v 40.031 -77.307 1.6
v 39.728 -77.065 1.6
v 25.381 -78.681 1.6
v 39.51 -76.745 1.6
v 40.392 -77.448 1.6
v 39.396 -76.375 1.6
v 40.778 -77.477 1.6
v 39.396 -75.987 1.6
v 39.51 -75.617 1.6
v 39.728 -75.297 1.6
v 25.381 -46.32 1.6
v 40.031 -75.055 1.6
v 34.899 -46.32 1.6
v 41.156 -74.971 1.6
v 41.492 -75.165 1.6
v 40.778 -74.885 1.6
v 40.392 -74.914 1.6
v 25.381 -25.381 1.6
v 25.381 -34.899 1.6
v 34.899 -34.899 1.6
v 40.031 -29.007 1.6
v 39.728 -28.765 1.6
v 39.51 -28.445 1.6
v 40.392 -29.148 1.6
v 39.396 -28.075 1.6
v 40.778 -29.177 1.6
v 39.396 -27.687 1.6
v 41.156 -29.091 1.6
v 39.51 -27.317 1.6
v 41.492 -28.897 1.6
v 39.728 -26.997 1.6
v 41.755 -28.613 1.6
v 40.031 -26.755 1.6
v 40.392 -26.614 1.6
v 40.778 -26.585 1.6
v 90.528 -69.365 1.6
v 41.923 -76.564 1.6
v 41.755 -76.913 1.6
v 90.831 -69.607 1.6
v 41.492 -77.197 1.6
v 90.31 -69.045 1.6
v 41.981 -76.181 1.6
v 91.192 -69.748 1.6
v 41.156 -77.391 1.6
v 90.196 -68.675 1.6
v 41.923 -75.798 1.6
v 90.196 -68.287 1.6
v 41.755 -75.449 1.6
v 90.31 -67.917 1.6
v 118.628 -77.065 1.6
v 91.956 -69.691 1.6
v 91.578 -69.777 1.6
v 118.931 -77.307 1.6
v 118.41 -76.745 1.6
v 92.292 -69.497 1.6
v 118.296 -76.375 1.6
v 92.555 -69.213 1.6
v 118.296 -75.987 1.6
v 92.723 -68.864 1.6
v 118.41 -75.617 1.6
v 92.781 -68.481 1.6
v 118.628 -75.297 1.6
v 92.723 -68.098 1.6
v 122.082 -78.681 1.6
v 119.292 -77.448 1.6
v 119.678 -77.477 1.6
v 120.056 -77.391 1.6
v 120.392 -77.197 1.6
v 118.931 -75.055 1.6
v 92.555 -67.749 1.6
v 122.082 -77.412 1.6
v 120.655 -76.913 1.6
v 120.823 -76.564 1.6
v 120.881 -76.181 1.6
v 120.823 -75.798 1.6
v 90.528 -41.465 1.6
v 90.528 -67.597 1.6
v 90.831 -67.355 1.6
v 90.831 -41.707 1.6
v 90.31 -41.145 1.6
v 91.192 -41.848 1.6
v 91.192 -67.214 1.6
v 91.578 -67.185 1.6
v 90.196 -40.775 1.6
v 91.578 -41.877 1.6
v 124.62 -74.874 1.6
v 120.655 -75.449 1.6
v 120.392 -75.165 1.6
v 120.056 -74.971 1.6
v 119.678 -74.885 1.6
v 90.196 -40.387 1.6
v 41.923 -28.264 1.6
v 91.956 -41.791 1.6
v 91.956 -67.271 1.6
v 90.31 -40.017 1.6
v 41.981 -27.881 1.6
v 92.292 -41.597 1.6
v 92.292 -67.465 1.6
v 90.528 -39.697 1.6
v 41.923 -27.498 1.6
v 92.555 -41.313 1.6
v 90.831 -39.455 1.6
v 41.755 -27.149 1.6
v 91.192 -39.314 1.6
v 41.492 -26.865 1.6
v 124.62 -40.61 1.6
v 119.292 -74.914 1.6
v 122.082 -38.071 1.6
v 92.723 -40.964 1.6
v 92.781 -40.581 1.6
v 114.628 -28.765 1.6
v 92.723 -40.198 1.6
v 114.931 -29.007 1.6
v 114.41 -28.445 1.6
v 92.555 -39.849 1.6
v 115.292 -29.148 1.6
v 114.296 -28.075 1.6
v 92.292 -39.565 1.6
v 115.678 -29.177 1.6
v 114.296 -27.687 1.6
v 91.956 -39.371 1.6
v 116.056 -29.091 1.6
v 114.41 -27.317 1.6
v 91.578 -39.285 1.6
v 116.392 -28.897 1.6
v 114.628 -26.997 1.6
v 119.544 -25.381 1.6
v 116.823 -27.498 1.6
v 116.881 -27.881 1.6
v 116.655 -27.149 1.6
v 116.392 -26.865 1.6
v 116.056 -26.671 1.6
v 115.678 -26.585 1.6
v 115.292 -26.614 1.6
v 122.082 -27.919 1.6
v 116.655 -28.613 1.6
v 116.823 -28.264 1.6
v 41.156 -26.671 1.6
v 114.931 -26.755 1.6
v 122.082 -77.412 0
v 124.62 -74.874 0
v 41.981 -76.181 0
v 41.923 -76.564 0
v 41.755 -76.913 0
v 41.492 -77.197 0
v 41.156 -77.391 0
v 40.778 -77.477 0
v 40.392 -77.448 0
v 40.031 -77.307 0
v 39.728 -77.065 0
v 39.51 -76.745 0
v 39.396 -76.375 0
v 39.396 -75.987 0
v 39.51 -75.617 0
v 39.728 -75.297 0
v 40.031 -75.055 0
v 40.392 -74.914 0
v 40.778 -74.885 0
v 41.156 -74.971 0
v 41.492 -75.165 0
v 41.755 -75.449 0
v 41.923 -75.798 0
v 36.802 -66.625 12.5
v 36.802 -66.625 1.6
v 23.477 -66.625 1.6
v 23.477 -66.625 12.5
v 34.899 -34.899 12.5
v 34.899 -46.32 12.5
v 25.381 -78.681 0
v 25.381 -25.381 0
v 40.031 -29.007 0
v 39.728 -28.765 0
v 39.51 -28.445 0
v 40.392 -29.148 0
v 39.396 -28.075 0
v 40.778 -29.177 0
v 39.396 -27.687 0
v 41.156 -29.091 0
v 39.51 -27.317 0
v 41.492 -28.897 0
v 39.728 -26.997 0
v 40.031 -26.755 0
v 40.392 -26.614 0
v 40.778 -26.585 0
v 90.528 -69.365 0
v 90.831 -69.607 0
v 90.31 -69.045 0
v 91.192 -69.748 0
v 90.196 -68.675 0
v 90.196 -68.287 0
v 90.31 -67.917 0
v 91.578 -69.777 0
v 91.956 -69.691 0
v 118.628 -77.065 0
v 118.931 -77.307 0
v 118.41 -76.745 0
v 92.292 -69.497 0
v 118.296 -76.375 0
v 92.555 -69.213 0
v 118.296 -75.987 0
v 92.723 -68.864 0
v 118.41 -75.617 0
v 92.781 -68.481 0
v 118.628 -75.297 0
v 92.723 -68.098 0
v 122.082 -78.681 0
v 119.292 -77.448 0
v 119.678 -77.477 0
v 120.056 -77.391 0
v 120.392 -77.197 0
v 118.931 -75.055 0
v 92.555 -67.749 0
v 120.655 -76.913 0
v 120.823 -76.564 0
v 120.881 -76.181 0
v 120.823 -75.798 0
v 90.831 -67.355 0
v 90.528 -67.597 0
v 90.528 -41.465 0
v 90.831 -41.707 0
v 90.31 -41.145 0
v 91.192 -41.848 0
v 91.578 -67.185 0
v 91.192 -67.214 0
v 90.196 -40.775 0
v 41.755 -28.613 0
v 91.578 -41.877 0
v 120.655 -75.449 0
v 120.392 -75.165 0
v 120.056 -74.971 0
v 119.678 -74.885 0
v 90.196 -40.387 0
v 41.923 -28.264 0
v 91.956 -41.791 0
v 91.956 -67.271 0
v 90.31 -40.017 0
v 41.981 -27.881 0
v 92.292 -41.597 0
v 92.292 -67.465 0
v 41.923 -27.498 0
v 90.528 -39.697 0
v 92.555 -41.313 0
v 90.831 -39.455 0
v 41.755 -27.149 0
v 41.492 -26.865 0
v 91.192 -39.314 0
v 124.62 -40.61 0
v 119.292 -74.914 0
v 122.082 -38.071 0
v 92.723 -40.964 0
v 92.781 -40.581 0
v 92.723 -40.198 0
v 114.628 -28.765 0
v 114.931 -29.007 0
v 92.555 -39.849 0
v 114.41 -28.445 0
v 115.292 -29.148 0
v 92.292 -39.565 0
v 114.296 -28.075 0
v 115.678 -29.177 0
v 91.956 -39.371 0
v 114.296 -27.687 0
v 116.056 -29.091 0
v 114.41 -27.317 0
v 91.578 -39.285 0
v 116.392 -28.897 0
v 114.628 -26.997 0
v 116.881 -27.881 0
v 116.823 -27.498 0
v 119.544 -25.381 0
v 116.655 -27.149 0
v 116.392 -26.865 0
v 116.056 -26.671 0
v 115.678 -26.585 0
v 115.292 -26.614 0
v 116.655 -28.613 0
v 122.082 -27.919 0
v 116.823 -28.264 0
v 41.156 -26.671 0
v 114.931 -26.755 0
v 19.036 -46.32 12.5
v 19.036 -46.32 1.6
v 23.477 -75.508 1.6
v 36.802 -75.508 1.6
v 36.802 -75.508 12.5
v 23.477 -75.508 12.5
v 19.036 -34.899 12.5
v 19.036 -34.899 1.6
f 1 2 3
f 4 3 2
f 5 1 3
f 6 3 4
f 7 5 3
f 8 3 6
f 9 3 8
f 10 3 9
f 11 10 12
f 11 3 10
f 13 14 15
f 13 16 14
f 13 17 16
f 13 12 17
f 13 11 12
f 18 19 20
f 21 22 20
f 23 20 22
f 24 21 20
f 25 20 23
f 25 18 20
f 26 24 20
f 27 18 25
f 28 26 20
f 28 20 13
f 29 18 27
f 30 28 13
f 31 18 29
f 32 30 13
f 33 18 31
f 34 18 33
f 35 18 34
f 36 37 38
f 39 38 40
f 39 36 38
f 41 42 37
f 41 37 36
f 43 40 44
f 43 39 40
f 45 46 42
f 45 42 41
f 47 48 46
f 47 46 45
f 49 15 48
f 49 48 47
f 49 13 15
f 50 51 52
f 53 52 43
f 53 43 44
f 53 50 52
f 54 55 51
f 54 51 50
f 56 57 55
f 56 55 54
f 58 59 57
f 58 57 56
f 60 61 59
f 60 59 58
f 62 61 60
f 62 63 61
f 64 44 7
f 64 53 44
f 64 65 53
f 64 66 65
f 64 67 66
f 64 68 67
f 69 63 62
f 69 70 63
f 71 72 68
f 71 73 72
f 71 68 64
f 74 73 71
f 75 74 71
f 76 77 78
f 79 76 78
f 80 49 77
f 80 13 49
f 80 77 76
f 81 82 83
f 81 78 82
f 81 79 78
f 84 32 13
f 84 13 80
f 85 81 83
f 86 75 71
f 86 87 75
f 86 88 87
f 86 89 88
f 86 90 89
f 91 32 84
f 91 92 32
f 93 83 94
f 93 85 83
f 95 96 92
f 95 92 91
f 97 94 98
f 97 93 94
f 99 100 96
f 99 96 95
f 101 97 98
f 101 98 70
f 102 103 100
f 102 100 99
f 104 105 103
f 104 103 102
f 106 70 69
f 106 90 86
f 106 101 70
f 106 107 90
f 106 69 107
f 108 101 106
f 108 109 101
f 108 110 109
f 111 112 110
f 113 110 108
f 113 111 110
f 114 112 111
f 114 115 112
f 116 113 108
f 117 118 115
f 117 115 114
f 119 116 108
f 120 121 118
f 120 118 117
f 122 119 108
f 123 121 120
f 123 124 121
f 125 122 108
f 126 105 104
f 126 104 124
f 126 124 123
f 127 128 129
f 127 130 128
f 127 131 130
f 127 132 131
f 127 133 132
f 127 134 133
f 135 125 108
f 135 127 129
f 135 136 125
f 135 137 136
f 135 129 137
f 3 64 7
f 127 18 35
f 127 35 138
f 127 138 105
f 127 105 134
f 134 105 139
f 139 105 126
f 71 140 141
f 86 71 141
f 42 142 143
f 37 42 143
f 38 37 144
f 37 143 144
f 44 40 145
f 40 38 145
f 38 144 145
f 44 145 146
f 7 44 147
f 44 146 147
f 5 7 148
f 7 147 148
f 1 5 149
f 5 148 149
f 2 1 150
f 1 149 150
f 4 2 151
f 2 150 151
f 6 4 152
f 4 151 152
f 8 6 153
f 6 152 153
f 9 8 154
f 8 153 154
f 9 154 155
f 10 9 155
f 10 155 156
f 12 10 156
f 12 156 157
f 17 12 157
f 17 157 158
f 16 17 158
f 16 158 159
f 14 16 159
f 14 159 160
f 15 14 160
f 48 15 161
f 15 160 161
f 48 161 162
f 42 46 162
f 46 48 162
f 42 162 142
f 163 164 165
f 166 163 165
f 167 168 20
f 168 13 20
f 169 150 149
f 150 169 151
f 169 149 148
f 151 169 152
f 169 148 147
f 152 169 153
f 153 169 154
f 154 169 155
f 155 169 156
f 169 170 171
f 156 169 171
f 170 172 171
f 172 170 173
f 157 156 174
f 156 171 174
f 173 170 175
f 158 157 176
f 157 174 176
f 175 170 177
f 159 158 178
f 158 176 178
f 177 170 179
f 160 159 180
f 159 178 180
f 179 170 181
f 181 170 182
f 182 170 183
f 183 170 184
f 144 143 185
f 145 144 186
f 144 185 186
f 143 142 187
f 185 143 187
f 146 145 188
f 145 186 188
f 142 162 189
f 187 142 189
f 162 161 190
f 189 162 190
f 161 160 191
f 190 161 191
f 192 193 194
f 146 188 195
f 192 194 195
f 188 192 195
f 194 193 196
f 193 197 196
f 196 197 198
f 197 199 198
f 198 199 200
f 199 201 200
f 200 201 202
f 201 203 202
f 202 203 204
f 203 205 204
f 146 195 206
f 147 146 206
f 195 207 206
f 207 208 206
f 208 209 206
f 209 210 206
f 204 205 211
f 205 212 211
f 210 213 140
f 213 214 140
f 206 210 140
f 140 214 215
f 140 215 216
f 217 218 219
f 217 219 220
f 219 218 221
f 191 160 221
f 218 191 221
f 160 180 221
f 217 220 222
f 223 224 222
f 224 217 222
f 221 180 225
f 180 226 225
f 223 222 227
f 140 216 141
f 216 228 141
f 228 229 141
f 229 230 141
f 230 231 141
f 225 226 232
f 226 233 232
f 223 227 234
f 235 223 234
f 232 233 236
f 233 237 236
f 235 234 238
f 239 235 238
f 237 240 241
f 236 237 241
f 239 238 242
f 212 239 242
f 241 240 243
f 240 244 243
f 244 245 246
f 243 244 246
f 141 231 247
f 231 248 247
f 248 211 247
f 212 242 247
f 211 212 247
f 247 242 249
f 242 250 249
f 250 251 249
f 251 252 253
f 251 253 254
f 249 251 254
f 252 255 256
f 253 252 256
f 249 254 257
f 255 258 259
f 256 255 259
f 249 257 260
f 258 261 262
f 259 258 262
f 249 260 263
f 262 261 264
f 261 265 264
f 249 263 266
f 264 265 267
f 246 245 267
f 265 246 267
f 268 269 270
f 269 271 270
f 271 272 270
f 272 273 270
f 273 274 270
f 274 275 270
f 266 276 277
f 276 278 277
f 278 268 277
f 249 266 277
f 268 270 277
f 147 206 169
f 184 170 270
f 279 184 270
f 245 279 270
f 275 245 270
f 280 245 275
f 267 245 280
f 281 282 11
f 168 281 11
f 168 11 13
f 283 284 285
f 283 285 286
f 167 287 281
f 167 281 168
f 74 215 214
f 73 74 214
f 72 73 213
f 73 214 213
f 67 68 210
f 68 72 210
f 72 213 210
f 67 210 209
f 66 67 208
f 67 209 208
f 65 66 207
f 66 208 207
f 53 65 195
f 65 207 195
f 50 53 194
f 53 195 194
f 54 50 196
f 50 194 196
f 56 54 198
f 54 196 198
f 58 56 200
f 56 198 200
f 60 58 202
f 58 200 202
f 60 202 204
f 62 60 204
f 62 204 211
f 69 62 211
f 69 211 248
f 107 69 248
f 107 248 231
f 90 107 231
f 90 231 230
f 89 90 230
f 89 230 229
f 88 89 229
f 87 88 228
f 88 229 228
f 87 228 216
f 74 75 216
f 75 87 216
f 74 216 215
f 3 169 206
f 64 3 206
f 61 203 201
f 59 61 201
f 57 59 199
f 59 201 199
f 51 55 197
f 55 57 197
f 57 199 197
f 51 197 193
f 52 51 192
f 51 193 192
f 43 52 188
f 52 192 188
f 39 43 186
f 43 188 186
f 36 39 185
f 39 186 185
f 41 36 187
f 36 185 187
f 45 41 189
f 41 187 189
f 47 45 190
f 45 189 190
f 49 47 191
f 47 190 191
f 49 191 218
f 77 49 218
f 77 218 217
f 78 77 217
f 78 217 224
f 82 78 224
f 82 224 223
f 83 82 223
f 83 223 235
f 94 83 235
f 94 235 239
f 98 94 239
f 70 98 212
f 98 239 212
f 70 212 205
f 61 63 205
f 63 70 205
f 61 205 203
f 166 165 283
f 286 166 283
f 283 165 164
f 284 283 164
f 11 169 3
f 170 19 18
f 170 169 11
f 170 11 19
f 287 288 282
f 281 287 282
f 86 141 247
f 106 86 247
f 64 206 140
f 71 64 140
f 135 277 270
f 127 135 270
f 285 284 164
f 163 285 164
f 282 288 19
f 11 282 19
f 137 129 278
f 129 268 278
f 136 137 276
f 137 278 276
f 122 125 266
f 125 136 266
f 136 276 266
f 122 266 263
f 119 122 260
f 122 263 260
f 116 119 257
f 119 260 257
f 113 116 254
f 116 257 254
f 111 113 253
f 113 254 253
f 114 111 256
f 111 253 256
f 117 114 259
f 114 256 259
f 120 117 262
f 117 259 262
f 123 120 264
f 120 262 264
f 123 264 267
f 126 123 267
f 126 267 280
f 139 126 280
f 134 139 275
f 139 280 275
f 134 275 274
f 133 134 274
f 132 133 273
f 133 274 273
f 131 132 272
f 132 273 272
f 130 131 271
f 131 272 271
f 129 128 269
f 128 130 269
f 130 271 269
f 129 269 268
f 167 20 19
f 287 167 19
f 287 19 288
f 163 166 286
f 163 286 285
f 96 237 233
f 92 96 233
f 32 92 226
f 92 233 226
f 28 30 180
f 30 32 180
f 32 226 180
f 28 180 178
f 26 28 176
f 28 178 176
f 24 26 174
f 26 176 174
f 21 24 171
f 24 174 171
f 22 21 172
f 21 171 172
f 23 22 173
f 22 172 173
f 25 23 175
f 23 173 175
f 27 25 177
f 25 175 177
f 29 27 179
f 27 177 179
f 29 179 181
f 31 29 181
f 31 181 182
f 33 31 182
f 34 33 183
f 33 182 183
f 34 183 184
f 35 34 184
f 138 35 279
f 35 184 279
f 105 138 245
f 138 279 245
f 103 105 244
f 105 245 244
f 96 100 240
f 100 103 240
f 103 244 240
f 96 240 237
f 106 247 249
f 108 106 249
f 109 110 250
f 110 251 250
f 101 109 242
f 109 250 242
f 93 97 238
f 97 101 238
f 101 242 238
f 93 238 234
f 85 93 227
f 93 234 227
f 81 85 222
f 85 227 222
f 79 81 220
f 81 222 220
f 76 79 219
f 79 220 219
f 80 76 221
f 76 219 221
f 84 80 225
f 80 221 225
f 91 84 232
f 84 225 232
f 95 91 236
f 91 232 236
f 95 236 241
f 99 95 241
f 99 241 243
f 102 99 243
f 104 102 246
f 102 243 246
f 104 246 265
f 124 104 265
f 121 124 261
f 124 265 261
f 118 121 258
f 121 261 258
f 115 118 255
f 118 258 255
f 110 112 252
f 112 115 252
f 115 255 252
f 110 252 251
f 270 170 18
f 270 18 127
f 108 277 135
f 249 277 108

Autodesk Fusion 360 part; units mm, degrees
sketch "Schizzo1" plane through (0, 0, 0) normal (0, 0, 1) x (1, 0, 0)
  line L0 (25.381, -78.681) -> (25.381, -25.381)
  line L1 (122.0824, -78.681) -> (122.0824, -77.4119)
  line L2 (122.0824, -77.4119) -> (124.6205, -74.8738)
  line L3 (124.6205, -74.8738) -> (124.6205, -40.6095)
  line L4 (25.381, -25.381) -> (119.5443, -25.381)
  line L5 (36.8024, -66.625) -> (23.4774, -66.625)
  line L6 (25.381, -25.381) -> (25.381, -34.8988)
  line L7 (34.8988, -34.8988) -> (19.0357, -34.8988)
  line L8 (25.381, -78.681) -> (122.0824, -78.681)
  line L9 (122.0824, -27.919) -> (122.0824, -38.0714)
  line L10 (122.0824, -27.919) -> (119.5443, -25.381)
  line L11 (124.6205, -40.6095) -> (122.0824, -38.0714)
  line L12 (19.0357, -34.8988) -> (19.0357, -46.3202)
  line L13 (19.0357, -46.3202) -> (34.8988, -46.3202)
  line L14 (34.8988, -46.3202) -> (34.8988, -34.8988)
  line L15 (36.8024, -75.5083) -> (36.8024, -66.625)
  line L16 (23.4774, -66.625) -> (23.4774, -75.5083)
  line L17 (36.8024, -75.5083) -> (23.4774, -75.5083)
  circle A0 centre (40.681, -27.881) radius 1.3
  circle A1 centre (40.681, -76.181) radius 1.3
  circle A2 centre (115.581, -27.881) radius 1.3
  circle A3 centre (119.581, -76.181) radius 1.3
  circle A4 centre (91.481, -68.481) radius 1.3
  circle A5 centre (91.481, -40.581) radius 1.3
  dimension "d30" = 53.3
  dimension "d31" = 94.1633
  dimension "d32" = 15.8631
  dimension "d34" = 9.5179
  dimension "d35" = 6.3452
  dimension "d36" = 25.381
  dimension "d37" = 25.381
  dimension "d40" = 2.5381
  dimension "d41" = 10.1524
  dimension "d43" = 96.7014
  dimension "d44" = 1.269
  dimension "d45" = 2.5381
  dimension "d46" = 34.2643
  dimension "d47" = 2.5381
  dimension "d49" = 2.5381
  dimension "d50" = 2.5381
  dimension "d51" = 2.5381
  dimension "d52" = 11.4214
  dimension "d55" = 13.325
  dimension "d58" = 3.1726
  dimension "d59" = 8.8833
  dimension "d61" = 1.9036
  dimension "d62" = 2.6
  dimension "d63" = 15.3
  dimension "d64" = 2.5
  dimension "d65" = 2.6
  dimension "d66" = 2.5
  dimension "d67" = 15.3
  dimension "d68" = 2.6
  dimension "d69" = 2.5
  dimension "d70" = 74.9
  dimension "d71" = 2.6
  dimension "d72" = 2.5
  dimension "d73" = 78.9
  dimension "d75" = 2.6
  dimension "d76" = 2.6
  dimension "d77" = 50.8
  dimension "d78" = 27.9
  dimension "d79" = 15.2
extrude "Estrusione1" add sketch "Schizzo1" along normal blind 1.6 contours L0 L7 L13 L14 | L0 L1 L2 L3 L4 L5 L6 L7 L8 L9 L10 L11 L13 L14 L15 L17 | L0 L5 L15 L17 makes body 1
extrude "Estrusione2" add sketch "Schizzo1" along normal blind 10.9 from surface at 1.6 separate body contours L0 L5 L15 L17 | L0 L5 L16 L17 makes body 2
extrude "Estrusione3" add sketch "Schizzo1" along normal blind 10.9 from surface at 1.6 contours L0 L7 L13 L14 | L0 L7 L12 L13 bodies 1
equation "d62 = 1.3 mm * 2"
